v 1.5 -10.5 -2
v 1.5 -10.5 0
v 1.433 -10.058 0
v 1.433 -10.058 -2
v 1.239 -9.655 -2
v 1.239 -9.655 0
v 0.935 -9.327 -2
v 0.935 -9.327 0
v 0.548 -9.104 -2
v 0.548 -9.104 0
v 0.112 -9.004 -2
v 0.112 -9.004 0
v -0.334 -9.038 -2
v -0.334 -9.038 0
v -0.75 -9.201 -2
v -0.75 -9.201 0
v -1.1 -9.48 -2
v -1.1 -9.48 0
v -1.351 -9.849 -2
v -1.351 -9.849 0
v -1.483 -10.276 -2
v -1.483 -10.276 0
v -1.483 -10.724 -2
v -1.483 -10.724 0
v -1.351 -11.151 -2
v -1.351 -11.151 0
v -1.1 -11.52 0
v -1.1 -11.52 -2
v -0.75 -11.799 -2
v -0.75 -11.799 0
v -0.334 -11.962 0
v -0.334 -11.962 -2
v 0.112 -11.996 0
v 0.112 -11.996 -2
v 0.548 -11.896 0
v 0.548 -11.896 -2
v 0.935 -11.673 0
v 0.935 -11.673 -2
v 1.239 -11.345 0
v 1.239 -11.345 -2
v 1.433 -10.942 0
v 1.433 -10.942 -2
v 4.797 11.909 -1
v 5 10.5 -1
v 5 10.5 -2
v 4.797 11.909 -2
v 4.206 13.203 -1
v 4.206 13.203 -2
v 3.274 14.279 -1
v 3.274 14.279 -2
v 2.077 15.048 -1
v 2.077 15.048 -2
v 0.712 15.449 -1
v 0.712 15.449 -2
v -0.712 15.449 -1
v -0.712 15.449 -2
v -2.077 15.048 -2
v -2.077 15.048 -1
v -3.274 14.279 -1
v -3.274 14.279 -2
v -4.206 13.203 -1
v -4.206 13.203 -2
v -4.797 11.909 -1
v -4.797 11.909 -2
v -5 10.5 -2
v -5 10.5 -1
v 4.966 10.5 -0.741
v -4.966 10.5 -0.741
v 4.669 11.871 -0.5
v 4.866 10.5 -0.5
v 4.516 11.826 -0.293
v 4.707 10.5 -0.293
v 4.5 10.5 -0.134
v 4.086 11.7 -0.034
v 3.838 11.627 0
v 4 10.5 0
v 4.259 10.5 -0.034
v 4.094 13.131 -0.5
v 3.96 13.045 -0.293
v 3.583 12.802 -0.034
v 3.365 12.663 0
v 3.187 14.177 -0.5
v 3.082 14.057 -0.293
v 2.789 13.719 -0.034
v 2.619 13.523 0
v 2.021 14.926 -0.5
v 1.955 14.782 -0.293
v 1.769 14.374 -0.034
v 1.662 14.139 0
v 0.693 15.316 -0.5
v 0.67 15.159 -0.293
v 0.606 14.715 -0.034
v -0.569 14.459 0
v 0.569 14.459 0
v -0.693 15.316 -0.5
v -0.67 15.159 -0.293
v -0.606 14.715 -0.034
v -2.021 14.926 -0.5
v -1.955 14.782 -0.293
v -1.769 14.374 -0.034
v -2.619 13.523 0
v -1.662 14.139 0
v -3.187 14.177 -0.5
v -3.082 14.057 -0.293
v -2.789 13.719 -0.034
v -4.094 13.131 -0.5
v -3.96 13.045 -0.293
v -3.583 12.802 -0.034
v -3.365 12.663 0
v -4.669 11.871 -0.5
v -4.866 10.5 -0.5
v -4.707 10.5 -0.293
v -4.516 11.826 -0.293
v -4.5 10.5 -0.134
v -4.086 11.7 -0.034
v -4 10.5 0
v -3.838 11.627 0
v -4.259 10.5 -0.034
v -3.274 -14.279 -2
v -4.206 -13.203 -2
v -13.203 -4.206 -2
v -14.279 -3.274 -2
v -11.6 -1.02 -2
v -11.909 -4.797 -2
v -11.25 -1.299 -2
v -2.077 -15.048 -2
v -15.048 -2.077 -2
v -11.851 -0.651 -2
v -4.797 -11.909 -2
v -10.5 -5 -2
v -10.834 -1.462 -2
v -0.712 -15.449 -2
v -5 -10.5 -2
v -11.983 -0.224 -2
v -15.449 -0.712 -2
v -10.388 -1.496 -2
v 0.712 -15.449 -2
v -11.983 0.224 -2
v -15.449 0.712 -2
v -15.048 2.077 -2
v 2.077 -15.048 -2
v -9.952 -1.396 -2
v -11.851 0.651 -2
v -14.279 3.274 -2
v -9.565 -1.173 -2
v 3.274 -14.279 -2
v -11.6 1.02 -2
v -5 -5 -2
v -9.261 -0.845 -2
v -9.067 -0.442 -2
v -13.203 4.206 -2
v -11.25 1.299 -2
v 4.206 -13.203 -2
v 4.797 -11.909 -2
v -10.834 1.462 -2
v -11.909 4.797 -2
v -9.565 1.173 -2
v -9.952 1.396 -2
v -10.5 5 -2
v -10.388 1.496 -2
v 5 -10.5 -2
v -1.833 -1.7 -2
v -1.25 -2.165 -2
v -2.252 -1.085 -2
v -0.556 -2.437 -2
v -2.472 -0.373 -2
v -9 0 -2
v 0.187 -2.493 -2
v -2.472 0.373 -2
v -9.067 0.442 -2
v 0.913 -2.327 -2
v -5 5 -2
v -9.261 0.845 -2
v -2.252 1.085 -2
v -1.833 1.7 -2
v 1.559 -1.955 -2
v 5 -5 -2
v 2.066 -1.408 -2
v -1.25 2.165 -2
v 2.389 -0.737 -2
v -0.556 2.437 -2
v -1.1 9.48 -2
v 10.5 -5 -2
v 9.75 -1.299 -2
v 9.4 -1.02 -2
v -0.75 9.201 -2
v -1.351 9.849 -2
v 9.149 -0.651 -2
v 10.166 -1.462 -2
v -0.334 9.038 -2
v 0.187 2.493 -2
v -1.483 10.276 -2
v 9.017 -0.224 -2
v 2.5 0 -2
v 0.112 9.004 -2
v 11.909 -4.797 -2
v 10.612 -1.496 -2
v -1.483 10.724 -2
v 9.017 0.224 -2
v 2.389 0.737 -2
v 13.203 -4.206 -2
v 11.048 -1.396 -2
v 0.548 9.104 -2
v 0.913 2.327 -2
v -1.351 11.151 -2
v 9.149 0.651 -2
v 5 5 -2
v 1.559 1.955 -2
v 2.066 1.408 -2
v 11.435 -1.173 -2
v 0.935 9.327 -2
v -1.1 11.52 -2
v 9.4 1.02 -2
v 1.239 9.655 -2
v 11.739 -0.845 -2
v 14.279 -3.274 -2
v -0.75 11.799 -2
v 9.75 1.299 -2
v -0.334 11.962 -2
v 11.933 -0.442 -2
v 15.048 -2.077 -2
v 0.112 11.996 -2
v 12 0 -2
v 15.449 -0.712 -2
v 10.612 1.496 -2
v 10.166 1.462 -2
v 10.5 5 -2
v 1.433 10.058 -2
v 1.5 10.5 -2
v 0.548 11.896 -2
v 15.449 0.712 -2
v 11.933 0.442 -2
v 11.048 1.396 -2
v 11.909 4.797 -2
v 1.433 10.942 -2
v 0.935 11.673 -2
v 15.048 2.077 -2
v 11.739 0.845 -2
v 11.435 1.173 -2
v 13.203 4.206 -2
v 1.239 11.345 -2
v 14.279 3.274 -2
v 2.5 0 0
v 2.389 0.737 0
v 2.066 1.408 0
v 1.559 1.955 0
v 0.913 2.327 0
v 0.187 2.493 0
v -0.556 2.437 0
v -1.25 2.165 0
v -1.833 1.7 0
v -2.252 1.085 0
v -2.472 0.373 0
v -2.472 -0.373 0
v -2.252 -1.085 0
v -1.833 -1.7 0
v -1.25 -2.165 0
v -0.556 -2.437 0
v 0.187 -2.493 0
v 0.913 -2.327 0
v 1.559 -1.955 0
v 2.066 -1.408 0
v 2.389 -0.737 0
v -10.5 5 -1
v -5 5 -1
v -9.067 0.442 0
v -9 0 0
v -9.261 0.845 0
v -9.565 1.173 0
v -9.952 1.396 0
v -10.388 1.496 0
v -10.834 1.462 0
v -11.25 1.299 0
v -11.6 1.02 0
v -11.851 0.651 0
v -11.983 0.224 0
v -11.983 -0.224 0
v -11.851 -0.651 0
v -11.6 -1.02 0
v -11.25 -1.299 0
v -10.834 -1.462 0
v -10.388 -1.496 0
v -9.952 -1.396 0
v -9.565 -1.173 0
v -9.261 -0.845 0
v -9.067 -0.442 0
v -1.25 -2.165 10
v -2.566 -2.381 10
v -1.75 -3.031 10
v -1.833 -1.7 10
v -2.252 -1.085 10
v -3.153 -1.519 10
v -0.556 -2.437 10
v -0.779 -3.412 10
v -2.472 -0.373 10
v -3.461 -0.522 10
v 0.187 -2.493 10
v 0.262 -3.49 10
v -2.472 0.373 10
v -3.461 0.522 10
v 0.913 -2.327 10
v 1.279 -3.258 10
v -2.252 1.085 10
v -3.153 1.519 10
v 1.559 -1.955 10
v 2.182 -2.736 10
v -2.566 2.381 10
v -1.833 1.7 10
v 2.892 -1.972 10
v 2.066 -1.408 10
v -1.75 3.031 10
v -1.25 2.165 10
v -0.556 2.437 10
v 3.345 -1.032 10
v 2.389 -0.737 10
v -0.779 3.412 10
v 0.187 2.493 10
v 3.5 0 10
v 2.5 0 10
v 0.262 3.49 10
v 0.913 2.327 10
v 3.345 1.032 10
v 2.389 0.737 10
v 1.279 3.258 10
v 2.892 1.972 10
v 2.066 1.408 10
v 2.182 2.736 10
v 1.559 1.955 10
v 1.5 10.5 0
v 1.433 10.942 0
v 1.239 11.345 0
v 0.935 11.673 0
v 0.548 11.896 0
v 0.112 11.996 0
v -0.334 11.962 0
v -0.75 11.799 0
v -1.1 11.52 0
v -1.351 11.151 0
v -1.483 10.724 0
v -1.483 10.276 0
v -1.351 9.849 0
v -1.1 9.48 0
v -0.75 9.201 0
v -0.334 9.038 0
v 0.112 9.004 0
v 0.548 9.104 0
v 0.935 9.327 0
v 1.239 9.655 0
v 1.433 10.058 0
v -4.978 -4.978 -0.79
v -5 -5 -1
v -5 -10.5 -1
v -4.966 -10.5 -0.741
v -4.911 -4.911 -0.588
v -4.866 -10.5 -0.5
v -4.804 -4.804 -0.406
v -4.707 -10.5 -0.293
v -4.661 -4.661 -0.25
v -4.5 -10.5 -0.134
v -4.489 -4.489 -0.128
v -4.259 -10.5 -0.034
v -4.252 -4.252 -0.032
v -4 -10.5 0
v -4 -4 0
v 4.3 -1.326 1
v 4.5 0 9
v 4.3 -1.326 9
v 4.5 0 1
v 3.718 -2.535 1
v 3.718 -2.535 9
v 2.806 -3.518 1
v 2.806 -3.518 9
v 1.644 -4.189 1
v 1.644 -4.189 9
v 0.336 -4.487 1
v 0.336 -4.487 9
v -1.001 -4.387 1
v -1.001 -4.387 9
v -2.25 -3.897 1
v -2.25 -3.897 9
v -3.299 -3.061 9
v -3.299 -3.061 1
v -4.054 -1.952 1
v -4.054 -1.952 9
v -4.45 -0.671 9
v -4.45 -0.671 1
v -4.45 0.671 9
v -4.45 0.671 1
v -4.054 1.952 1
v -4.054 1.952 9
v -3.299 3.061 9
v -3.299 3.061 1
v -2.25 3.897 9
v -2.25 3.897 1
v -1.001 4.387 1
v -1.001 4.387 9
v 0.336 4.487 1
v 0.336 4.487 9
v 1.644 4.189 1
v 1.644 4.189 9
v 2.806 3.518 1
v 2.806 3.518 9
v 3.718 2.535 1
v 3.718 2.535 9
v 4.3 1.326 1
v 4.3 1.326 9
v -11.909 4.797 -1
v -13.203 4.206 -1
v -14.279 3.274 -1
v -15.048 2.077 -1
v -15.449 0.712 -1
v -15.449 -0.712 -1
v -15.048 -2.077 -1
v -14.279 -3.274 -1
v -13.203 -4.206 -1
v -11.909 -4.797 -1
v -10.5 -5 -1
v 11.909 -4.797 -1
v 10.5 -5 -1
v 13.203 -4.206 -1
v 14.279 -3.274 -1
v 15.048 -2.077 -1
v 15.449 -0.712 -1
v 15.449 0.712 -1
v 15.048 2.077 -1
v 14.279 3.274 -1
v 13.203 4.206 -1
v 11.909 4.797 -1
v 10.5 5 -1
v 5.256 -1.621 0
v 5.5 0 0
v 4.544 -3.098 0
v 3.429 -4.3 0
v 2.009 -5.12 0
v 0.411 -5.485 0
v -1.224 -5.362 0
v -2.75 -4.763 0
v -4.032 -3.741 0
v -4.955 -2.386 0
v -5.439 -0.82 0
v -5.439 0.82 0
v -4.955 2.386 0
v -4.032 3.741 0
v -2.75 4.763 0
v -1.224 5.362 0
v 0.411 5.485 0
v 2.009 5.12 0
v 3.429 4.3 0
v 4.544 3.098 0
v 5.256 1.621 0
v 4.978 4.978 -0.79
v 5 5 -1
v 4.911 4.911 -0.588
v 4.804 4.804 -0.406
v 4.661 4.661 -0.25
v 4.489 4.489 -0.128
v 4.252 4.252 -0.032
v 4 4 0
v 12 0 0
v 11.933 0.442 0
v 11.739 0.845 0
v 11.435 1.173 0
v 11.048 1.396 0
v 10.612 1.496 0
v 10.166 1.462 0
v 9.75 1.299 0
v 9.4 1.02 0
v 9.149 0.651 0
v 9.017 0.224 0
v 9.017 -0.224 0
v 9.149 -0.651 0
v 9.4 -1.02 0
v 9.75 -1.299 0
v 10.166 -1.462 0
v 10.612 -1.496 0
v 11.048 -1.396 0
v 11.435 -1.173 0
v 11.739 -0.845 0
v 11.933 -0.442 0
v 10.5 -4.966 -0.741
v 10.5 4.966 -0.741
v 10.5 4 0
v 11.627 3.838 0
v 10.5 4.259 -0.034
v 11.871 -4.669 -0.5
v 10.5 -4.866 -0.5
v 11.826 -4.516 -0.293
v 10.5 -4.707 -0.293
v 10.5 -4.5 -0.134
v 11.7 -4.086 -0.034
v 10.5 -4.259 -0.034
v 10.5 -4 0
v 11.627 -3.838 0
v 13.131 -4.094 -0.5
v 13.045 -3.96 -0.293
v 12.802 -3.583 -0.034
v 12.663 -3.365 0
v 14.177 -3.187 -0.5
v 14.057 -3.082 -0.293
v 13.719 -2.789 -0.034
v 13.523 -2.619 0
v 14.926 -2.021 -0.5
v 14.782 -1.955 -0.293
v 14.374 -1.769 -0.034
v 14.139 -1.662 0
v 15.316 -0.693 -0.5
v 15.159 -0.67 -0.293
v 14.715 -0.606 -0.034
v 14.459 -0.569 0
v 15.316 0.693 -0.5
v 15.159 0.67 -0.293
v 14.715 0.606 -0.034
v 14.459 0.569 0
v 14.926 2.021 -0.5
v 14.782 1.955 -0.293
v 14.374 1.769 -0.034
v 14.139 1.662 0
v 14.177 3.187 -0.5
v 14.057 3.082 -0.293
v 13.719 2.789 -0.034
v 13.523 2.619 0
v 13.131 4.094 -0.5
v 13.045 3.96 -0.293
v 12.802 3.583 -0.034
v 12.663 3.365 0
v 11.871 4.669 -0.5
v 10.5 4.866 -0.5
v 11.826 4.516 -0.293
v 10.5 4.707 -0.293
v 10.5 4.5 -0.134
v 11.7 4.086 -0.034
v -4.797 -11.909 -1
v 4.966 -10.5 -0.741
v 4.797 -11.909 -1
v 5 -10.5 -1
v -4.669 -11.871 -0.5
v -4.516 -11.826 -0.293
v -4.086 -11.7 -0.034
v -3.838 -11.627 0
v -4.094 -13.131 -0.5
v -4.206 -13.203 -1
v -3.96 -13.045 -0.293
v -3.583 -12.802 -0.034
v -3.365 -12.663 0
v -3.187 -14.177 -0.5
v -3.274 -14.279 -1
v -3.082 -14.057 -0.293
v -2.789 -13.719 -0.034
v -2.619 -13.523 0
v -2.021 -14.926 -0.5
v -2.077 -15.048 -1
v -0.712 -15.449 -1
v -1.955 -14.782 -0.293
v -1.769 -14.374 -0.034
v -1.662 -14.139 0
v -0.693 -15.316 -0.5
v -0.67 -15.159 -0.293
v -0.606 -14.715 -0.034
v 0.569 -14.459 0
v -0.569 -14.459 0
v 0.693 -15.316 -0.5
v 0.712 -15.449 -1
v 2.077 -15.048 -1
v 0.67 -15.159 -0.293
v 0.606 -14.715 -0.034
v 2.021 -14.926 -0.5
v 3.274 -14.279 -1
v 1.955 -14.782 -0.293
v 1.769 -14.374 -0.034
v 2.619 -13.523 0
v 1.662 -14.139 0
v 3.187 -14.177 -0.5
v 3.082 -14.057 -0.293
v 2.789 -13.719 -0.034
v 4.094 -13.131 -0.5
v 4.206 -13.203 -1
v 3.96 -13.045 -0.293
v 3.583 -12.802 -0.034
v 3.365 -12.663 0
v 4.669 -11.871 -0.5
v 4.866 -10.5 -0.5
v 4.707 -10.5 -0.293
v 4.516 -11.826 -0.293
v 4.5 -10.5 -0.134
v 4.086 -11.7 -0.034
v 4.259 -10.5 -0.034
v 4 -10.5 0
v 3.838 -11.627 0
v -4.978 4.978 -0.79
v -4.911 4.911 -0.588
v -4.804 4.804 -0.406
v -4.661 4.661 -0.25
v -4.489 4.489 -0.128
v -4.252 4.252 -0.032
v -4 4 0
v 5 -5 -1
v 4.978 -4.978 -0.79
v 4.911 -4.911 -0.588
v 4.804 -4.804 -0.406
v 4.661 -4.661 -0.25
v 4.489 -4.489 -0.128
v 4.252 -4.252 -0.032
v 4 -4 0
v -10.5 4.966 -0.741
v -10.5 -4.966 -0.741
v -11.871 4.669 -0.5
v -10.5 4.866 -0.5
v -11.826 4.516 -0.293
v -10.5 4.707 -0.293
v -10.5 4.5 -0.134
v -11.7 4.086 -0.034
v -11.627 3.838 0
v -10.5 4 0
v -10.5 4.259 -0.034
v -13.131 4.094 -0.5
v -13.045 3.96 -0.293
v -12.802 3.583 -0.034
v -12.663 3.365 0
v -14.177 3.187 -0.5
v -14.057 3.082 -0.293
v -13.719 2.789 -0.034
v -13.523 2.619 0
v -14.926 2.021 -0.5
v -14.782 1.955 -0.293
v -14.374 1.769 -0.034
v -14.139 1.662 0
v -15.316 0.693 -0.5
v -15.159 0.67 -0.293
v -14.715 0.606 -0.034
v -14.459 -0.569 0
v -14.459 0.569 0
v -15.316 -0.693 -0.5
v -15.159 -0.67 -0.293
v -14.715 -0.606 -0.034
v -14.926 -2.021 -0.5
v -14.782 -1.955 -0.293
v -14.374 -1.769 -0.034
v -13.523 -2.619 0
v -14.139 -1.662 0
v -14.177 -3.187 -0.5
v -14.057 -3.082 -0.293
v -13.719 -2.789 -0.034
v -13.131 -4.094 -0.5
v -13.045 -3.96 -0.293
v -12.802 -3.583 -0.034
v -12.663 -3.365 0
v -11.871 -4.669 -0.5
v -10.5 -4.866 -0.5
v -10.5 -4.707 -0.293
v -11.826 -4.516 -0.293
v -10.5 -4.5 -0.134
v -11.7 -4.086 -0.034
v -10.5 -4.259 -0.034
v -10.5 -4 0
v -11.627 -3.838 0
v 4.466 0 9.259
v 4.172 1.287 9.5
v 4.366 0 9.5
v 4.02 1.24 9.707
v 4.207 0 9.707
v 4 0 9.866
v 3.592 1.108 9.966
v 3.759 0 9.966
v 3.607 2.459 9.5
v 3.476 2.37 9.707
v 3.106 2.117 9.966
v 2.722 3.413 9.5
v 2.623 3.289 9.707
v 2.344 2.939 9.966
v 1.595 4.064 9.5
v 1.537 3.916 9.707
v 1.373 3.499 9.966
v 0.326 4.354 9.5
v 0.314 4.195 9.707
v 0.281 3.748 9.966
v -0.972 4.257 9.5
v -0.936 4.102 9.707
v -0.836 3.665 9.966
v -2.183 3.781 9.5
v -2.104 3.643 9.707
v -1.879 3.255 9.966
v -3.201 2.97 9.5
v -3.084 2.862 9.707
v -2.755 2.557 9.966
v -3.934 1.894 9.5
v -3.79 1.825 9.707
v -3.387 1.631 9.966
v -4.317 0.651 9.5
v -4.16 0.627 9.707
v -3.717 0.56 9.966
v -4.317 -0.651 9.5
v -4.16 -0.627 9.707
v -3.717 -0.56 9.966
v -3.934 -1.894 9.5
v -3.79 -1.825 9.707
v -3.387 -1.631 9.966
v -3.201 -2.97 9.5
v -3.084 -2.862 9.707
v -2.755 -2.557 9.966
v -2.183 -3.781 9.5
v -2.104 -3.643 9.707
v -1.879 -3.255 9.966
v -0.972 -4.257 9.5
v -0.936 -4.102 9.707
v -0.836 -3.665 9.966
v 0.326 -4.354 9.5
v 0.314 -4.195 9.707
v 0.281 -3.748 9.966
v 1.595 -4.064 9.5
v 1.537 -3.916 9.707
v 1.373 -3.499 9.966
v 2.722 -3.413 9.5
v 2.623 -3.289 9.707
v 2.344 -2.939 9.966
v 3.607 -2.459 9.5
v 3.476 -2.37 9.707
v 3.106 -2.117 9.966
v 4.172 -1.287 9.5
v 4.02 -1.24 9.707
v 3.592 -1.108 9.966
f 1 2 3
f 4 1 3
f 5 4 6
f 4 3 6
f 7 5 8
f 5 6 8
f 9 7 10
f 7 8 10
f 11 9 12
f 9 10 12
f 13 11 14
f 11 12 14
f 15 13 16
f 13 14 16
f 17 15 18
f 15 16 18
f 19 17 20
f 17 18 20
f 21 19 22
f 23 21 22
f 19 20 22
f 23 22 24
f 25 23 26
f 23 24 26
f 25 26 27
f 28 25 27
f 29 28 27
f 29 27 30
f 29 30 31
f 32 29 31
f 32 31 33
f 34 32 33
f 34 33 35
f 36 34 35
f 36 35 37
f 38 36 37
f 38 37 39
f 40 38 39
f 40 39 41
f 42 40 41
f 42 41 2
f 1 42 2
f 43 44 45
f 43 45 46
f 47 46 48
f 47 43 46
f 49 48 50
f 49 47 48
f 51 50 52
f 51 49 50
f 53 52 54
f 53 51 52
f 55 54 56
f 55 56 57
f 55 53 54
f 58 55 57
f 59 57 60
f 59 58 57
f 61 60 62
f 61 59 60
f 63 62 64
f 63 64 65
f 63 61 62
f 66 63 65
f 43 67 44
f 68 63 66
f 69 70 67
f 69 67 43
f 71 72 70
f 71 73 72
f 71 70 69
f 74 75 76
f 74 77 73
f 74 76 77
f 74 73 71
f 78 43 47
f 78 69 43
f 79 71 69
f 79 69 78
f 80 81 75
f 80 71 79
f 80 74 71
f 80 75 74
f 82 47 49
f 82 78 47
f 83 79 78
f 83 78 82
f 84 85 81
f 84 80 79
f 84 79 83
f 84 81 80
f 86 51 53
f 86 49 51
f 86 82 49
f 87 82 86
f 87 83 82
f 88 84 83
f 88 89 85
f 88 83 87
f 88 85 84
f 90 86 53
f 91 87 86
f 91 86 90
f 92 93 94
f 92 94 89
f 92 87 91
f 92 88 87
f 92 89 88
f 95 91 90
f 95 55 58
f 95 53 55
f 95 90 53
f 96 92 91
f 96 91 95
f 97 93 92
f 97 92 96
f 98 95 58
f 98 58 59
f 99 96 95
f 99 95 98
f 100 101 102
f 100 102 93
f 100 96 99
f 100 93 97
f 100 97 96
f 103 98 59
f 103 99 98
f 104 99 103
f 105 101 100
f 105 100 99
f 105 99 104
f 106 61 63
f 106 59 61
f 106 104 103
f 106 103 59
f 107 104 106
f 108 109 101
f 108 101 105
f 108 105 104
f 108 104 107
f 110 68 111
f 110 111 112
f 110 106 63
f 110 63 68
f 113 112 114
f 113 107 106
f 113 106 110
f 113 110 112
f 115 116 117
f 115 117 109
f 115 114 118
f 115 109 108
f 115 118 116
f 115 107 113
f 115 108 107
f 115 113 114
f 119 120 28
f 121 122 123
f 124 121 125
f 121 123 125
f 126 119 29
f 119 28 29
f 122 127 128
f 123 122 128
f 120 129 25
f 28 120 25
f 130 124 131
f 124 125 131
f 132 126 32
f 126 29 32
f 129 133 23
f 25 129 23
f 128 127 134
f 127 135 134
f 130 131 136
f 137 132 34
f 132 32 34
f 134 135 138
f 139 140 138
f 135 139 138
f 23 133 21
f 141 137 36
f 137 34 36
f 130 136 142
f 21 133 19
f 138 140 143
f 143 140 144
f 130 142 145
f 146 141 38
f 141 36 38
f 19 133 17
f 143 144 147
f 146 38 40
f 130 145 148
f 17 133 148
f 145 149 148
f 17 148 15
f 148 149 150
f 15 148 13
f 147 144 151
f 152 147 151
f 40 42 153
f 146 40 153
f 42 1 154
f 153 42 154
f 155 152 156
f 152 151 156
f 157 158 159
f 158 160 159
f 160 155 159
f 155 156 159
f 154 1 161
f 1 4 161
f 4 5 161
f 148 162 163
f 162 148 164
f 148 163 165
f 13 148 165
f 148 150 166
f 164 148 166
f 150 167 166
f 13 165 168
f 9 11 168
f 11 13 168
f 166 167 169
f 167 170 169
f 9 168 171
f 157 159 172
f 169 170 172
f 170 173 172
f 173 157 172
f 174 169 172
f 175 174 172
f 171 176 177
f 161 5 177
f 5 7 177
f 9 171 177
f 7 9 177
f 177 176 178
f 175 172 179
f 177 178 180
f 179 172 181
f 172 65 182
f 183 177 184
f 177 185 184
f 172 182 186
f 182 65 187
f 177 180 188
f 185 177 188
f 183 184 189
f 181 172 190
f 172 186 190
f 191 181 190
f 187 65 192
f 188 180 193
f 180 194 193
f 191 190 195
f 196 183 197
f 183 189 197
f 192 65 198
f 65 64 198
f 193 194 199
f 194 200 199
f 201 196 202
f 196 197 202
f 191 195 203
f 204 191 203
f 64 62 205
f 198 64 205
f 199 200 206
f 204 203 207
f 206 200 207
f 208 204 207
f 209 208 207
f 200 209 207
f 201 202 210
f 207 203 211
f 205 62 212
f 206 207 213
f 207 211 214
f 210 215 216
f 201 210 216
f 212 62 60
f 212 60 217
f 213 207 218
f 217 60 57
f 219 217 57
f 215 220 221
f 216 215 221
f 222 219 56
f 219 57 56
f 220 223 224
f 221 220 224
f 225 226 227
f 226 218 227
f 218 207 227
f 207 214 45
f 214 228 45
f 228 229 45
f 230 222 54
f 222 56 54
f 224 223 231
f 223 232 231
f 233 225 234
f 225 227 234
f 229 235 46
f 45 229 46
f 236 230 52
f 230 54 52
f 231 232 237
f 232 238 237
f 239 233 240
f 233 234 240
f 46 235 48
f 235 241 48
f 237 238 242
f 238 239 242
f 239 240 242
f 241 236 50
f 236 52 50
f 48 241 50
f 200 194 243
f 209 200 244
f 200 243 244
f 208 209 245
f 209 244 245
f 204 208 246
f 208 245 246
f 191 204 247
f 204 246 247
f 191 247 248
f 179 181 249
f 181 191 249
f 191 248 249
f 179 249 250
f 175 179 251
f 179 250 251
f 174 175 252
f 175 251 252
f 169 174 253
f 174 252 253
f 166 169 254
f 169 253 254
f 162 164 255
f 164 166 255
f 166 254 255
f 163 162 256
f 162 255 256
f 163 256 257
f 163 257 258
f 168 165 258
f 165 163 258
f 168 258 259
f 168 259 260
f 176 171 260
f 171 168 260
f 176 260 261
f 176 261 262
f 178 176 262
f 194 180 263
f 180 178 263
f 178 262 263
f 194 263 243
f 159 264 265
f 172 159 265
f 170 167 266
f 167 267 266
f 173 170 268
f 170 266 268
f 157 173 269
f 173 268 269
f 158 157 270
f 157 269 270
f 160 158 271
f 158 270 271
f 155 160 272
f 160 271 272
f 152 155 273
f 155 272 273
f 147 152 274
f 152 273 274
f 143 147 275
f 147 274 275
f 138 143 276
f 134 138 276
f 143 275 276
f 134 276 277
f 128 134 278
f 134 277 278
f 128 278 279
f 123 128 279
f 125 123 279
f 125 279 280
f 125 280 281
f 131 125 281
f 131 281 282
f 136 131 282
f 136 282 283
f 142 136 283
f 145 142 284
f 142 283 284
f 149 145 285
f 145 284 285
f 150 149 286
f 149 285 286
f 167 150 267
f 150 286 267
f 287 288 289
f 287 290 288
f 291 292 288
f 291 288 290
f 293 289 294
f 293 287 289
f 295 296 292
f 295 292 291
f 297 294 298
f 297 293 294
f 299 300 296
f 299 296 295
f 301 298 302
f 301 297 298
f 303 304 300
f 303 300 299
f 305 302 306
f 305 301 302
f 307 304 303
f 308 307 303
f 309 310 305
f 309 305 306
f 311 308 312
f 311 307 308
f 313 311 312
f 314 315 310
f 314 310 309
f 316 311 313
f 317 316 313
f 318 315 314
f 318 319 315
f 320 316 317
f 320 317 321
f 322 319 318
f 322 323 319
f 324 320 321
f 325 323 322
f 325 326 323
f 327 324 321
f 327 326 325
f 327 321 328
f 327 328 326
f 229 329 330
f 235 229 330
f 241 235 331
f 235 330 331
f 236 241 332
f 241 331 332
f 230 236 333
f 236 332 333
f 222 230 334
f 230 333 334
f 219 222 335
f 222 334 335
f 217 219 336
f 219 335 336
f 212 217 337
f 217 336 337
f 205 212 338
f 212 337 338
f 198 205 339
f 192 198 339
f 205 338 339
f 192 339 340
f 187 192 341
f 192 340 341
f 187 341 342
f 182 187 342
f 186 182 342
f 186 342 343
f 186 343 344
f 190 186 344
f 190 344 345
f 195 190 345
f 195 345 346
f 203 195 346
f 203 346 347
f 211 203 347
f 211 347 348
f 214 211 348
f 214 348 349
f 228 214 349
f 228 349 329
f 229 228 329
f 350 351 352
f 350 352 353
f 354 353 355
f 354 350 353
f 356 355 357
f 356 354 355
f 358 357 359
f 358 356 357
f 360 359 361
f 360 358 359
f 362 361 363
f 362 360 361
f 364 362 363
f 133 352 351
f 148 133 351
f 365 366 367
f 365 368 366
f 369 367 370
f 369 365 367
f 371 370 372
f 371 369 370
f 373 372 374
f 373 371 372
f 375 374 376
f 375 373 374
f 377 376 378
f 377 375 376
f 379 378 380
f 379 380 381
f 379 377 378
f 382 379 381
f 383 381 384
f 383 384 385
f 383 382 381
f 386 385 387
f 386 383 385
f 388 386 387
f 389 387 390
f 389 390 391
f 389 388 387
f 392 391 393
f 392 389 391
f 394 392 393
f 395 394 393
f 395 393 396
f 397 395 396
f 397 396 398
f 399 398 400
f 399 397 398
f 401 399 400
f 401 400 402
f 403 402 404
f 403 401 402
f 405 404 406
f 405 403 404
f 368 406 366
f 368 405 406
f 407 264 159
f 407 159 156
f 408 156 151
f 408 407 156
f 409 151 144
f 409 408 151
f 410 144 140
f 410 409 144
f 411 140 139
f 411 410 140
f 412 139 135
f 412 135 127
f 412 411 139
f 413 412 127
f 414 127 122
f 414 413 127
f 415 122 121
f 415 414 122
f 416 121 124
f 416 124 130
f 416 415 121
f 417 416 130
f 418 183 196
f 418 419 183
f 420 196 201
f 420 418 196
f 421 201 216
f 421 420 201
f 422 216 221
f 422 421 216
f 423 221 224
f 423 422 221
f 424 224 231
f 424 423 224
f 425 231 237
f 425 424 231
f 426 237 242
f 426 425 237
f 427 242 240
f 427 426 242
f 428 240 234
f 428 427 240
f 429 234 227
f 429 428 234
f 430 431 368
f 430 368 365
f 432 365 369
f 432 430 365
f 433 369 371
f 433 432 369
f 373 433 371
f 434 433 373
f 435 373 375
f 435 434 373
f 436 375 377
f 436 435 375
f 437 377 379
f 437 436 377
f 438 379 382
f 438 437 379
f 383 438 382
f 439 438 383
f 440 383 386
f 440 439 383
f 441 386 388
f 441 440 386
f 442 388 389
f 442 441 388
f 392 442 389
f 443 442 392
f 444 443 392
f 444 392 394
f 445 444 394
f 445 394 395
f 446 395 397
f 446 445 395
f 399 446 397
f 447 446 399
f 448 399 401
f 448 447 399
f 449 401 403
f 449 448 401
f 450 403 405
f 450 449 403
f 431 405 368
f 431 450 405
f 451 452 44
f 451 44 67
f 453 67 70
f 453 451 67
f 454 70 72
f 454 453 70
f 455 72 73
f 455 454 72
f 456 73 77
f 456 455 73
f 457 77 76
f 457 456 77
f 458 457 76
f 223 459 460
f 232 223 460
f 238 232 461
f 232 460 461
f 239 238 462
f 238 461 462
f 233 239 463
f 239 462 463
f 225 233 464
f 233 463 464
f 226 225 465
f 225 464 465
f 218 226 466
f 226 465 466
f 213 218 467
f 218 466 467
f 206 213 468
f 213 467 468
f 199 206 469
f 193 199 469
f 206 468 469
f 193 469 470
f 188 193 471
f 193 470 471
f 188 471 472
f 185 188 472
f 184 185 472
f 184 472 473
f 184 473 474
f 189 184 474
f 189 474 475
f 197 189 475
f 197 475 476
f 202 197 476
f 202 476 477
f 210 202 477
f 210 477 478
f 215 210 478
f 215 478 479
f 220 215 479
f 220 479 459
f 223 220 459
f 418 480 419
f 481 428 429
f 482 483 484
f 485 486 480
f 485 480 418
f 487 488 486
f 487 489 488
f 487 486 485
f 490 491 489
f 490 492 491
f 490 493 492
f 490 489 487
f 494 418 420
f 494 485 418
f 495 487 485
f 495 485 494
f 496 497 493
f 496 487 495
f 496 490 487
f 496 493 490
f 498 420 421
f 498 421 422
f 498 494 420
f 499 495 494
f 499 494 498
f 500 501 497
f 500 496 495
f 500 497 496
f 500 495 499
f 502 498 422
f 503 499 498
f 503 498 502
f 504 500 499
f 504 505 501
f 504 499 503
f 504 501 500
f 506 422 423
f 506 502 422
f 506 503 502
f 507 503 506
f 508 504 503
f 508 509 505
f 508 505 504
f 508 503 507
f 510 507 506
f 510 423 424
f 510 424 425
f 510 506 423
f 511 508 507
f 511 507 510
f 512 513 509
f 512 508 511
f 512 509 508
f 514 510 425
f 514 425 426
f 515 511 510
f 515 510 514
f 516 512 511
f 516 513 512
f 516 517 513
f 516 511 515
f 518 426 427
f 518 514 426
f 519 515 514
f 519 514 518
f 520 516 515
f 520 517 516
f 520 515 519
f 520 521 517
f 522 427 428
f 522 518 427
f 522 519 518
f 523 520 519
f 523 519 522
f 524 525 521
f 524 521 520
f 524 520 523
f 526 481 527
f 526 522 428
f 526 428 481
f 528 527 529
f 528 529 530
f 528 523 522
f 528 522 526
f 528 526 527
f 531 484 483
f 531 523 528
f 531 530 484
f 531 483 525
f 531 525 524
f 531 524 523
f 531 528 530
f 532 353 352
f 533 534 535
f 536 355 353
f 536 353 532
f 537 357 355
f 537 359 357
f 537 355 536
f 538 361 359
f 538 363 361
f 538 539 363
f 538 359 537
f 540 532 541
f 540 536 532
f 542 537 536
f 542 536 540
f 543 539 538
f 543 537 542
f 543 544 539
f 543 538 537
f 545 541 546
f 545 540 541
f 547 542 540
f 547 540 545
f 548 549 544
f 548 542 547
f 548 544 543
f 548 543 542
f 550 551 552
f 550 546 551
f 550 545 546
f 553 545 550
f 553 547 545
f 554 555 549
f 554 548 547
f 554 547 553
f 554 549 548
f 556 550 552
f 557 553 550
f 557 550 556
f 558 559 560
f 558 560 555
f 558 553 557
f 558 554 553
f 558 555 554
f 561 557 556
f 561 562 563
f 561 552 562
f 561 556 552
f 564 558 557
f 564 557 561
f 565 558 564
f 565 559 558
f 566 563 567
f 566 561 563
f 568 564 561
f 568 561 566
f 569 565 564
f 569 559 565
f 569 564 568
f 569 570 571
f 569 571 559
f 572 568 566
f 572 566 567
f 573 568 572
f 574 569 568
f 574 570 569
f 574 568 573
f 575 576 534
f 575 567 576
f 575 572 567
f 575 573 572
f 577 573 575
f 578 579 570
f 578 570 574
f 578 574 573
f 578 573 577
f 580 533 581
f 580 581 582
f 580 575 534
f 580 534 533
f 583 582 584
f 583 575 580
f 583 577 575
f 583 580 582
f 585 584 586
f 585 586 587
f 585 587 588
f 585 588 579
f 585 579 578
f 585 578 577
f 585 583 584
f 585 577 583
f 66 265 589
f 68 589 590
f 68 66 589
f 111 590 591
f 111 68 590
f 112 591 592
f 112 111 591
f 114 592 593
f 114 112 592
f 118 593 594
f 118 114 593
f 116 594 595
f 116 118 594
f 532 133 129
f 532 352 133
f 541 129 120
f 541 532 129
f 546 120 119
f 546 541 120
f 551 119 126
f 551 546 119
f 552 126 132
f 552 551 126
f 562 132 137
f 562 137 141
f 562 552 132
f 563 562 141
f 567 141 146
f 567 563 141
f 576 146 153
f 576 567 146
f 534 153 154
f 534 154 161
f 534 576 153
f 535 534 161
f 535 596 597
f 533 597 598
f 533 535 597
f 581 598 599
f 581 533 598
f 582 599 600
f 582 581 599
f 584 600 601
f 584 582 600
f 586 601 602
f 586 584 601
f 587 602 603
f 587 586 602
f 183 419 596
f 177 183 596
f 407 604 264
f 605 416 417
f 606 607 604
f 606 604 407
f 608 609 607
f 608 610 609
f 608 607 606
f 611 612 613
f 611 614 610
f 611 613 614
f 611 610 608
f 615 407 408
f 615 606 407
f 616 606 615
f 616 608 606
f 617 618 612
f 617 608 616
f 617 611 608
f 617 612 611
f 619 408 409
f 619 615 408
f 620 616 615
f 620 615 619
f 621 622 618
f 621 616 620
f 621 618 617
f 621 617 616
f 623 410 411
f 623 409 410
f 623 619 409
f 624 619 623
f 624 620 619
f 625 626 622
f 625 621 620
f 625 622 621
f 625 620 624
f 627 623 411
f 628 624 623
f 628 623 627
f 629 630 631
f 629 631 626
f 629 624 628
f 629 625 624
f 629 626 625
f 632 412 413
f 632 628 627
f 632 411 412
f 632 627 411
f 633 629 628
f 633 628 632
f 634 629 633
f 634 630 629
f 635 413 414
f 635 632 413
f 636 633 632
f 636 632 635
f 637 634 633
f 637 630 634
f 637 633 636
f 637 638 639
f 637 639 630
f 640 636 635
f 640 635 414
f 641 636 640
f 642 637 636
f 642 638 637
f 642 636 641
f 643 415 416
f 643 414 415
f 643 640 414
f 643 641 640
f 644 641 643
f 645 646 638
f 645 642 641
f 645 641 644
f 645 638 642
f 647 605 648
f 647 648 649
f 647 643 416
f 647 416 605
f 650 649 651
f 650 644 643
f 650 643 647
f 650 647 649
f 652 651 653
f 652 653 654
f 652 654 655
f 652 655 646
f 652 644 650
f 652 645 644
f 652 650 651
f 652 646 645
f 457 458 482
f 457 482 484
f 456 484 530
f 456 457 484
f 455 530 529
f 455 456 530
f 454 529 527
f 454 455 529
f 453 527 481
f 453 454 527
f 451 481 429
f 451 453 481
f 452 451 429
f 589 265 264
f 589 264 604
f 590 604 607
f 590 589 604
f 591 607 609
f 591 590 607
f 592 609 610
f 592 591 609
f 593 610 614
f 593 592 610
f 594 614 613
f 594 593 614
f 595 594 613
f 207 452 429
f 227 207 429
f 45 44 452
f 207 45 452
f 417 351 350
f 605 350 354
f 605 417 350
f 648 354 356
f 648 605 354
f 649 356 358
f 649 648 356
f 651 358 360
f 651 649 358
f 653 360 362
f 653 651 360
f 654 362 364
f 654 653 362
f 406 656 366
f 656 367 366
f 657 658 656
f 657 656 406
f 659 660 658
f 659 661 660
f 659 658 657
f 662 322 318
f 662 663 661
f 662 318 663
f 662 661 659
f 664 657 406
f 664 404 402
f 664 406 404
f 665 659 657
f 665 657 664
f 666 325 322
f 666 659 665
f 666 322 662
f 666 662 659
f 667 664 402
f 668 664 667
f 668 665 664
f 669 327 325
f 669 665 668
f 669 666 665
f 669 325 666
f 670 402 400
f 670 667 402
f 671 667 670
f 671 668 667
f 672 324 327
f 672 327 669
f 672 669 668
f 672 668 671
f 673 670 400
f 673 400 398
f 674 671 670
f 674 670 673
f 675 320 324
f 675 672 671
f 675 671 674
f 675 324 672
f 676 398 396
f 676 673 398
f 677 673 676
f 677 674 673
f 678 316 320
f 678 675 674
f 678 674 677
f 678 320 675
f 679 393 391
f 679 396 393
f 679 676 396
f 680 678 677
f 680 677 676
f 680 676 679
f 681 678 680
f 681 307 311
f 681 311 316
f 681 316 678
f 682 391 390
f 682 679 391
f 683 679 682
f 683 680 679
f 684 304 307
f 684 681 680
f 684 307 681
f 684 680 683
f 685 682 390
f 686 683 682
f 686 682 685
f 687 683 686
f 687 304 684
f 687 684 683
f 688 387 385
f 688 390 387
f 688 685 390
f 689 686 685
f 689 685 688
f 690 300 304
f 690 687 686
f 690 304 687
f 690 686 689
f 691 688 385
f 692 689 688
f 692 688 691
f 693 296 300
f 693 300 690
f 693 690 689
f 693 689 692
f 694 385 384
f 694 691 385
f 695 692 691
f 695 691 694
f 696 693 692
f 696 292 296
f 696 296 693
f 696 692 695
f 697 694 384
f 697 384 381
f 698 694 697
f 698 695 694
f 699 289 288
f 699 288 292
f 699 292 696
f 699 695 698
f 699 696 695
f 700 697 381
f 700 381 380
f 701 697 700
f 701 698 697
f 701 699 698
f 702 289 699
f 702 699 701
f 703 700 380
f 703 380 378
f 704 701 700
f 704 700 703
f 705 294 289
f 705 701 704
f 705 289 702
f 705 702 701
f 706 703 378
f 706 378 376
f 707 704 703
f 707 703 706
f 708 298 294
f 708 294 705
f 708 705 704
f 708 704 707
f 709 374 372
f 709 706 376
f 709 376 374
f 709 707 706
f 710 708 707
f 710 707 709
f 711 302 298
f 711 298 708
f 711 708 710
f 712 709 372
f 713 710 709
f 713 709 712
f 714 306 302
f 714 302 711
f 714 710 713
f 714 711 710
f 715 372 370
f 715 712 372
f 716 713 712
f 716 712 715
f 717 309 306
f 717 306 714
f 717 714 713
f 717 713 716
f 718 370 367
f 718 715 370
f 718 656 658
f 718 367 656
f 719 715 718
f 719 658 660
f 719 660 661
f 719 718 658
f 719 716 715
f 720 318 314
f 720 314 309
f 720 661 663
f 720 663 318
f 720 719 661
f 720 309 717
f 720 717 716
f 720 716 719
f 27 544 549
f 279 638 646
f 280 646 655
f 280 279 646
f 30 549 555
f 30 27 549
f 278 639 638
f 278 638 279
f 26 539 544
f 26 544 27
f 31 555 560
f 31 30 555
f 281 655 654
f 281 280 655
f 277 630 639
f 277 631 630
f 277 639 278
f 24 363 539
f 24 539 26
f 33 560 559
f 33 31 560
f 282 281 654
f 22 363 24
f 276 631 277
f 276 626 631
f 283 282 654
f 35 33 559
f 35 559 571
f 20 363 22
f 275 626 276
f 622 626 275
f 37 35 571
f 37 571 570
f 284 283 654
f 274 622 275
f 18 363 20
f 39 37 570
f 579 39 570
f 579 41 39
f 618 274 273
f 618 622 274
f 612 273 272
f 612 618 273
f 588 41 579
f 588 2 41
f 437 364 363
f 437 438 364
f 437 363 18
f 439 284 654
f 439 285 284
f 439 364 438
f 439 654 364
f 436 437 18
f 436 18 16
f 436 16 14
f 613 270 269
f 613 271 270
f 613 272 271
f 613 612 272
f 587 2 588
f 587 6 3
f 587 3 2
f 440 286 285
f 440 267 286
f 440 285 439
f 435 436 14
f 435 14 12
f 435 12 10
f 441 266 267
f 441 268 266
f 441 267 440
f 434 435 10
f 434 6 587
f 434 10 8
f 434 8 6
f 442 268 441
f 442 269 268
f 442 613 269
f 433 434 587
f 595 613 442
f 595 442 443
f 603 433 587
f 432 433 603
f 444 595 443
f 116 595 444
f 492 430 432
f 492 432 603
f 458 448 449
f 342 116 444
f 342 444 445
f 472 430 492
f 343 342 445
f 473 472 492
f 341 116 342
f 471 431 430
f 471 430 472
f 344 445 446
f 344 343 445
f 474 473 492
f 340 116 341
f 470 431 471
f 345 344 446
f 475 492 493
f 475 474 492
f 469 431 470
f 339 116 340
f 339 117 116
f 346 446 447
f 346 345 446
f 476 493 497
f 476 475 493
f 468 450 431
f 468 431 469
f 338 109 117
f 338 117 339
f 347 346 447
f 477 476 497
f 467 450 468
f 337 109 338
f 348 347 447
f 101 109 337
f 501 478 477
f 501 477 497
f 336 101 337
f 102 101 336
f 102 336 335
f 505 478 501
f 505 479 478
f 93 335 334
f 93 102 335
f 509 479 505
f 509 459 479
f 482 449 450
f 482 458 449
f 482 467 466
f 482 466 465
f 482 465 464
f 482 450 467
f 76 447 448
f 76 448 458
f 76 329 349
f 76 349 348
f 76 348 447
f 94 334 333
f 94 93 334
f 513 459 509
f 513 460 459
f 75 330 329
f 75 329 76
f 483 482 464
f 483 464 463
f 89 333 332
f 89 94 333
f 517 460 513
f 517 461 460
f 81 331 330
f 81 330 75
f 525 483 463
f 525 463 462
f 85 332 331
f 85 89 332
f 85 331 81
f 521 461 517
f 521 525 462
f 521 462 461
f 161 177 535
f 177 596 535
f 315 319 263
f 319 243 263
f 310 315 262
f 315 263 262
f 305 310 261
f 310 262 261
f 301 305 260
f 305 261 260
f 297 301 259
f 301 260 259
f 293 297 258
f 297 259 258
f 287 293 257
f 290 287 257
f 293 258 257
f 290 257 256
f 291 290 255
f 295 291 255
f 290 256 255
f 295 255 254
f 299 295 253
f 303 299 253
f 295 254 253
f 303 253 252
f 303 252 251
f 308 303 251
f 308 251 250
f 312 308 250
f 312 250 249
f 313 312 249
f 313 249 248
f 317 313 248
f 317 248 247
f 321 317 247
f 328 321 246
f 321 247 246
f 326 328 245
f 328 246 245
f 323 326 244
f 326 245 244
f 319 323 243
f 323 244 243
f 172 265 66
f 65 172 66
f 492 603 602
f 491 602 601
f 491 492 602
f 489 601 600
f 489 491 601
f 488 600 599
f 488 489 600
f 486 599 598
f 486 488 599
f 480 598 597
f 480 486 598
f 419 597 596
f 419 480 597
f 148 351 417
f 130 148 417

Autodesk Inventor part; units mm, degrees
ref_plane "YZ Plane" through (0, 0, 0) normal (1, 0, 0) x (0, 1, 0)
ref_plane "XZ Plane" through (0, 0, 0) normal (0, 1, 0) x (-1, 0, 0)
ref_plane "XY Plane" through (0, 0, 0) normal (0, 0, 1) x (1, 0, 0)
sketch "Sketch1" plane through (0, 0, 0) normal (0, 0, 1) x (1, 0, 0)
  circle A0 centre (0, 0) radius 2.5
  line L0 (0, 0) -> (-10.5, 0)
  circle A1 centre (-10.5, 0) radius 1.5
  arc A2 (-10.5, 5) -> (-10.5, -5) centre (-10.5, 0) ccw
  line L1 (-10.5, 5) -> (0, 5)
  line L2 (0, 5) -> (0, -5)
  line L3 (0, -5) -> (-10.5, -5)
  line L4 (0, 0) -> (0, -10.5)
  circle A3 centre (0, -10.5) radius 1.5
  arc A4 (-5, -10.5) -> (5, -10.5) centre (0, -10.5) ccw
  line L5 (-5, -10.5) -> (-5, 0)
  line L6 (5, 0) -> (5, -10.5)
  line L7 (0, 0) -> (10.5, 0)
  circle A5 centre (10.5, 0) radius 1.5
  arc A6 (10.5, -5) -> (10.5, 5) centre (10.5, 0) ccw
  line L8 (10.5, -5) -> (0, -5)
  line L9 (0, 5) -> (10.5, 5)
  line L10 (0, 0) -> (0, 10.5)
  circle A7 centre (0, 10.5) radius 1.5
  arc A8 (5, 10.5) -> (-5, 10.5) centre (0, 10.5) ccw
  line L11 (5, 10.5) -> (5, 0)
  line L12 (-5, 0) -> (-5, 10.5)
  circle A9 centre (0, 0) radius 4.5
  point P0 (-5, -5)
  point P1 (5, -5)
  point P2 (5, 5)
  point P3 (-5, 5)
  dimension "d0" = 10.5
  dimension "d1" = 3
  dimension "d2" = 5
  dimension "d3" = 10
  dimension "d6" = 360
  dimension "d8" = 9
extrude "Extrusion1" add sketch "Sketch1" against normal blind 2 contours L7 A9 L2 A0 | A0 L2 A9 L7 | A0 L0 A9 L2 | L2 A9 L0 A0 | A9 L2 L9 L11 L7 | L7 L6 L8 L2 A9 | A9 L0 L12 L1 L2 | L2 L3 L5 L0 A9 | L11 L9 A6 L8 L6 | L1 L12 A8 L11 L9 | L8 L6 A4 L5 L3 | L5 L3 A2 L1 L12
extrude "Extrusion2" add sketch "Sketch1" along normal blind 10 contours L7 A9 L2 A0 | A0 L2 A9 L7 | A0 L0 A9 L2 | L2 A9 L0 A0
fillet "Fillet1" radius 1 12 edges at (-7.75, -5, 0) (-7.75, 5, 0) (-15.5, 0, 0) (5, -7.75, 0) (-5, -7.75, 0) (0, -15.5, 0) (15.5, 0, 0) (7.75, 5, 0) (7.75, -5, 0) (-5, 7.75, 0) (5, 7.75, 0) (0, 15.5, 0)
chamfer "Chamfer1" distance 1 angle 45 1 edges at (-4.5, 0, 0)
fillet "Fillet2" radius 1 1 edges at (-4.5, 0, 10)
properties part number "dudukan gps"
